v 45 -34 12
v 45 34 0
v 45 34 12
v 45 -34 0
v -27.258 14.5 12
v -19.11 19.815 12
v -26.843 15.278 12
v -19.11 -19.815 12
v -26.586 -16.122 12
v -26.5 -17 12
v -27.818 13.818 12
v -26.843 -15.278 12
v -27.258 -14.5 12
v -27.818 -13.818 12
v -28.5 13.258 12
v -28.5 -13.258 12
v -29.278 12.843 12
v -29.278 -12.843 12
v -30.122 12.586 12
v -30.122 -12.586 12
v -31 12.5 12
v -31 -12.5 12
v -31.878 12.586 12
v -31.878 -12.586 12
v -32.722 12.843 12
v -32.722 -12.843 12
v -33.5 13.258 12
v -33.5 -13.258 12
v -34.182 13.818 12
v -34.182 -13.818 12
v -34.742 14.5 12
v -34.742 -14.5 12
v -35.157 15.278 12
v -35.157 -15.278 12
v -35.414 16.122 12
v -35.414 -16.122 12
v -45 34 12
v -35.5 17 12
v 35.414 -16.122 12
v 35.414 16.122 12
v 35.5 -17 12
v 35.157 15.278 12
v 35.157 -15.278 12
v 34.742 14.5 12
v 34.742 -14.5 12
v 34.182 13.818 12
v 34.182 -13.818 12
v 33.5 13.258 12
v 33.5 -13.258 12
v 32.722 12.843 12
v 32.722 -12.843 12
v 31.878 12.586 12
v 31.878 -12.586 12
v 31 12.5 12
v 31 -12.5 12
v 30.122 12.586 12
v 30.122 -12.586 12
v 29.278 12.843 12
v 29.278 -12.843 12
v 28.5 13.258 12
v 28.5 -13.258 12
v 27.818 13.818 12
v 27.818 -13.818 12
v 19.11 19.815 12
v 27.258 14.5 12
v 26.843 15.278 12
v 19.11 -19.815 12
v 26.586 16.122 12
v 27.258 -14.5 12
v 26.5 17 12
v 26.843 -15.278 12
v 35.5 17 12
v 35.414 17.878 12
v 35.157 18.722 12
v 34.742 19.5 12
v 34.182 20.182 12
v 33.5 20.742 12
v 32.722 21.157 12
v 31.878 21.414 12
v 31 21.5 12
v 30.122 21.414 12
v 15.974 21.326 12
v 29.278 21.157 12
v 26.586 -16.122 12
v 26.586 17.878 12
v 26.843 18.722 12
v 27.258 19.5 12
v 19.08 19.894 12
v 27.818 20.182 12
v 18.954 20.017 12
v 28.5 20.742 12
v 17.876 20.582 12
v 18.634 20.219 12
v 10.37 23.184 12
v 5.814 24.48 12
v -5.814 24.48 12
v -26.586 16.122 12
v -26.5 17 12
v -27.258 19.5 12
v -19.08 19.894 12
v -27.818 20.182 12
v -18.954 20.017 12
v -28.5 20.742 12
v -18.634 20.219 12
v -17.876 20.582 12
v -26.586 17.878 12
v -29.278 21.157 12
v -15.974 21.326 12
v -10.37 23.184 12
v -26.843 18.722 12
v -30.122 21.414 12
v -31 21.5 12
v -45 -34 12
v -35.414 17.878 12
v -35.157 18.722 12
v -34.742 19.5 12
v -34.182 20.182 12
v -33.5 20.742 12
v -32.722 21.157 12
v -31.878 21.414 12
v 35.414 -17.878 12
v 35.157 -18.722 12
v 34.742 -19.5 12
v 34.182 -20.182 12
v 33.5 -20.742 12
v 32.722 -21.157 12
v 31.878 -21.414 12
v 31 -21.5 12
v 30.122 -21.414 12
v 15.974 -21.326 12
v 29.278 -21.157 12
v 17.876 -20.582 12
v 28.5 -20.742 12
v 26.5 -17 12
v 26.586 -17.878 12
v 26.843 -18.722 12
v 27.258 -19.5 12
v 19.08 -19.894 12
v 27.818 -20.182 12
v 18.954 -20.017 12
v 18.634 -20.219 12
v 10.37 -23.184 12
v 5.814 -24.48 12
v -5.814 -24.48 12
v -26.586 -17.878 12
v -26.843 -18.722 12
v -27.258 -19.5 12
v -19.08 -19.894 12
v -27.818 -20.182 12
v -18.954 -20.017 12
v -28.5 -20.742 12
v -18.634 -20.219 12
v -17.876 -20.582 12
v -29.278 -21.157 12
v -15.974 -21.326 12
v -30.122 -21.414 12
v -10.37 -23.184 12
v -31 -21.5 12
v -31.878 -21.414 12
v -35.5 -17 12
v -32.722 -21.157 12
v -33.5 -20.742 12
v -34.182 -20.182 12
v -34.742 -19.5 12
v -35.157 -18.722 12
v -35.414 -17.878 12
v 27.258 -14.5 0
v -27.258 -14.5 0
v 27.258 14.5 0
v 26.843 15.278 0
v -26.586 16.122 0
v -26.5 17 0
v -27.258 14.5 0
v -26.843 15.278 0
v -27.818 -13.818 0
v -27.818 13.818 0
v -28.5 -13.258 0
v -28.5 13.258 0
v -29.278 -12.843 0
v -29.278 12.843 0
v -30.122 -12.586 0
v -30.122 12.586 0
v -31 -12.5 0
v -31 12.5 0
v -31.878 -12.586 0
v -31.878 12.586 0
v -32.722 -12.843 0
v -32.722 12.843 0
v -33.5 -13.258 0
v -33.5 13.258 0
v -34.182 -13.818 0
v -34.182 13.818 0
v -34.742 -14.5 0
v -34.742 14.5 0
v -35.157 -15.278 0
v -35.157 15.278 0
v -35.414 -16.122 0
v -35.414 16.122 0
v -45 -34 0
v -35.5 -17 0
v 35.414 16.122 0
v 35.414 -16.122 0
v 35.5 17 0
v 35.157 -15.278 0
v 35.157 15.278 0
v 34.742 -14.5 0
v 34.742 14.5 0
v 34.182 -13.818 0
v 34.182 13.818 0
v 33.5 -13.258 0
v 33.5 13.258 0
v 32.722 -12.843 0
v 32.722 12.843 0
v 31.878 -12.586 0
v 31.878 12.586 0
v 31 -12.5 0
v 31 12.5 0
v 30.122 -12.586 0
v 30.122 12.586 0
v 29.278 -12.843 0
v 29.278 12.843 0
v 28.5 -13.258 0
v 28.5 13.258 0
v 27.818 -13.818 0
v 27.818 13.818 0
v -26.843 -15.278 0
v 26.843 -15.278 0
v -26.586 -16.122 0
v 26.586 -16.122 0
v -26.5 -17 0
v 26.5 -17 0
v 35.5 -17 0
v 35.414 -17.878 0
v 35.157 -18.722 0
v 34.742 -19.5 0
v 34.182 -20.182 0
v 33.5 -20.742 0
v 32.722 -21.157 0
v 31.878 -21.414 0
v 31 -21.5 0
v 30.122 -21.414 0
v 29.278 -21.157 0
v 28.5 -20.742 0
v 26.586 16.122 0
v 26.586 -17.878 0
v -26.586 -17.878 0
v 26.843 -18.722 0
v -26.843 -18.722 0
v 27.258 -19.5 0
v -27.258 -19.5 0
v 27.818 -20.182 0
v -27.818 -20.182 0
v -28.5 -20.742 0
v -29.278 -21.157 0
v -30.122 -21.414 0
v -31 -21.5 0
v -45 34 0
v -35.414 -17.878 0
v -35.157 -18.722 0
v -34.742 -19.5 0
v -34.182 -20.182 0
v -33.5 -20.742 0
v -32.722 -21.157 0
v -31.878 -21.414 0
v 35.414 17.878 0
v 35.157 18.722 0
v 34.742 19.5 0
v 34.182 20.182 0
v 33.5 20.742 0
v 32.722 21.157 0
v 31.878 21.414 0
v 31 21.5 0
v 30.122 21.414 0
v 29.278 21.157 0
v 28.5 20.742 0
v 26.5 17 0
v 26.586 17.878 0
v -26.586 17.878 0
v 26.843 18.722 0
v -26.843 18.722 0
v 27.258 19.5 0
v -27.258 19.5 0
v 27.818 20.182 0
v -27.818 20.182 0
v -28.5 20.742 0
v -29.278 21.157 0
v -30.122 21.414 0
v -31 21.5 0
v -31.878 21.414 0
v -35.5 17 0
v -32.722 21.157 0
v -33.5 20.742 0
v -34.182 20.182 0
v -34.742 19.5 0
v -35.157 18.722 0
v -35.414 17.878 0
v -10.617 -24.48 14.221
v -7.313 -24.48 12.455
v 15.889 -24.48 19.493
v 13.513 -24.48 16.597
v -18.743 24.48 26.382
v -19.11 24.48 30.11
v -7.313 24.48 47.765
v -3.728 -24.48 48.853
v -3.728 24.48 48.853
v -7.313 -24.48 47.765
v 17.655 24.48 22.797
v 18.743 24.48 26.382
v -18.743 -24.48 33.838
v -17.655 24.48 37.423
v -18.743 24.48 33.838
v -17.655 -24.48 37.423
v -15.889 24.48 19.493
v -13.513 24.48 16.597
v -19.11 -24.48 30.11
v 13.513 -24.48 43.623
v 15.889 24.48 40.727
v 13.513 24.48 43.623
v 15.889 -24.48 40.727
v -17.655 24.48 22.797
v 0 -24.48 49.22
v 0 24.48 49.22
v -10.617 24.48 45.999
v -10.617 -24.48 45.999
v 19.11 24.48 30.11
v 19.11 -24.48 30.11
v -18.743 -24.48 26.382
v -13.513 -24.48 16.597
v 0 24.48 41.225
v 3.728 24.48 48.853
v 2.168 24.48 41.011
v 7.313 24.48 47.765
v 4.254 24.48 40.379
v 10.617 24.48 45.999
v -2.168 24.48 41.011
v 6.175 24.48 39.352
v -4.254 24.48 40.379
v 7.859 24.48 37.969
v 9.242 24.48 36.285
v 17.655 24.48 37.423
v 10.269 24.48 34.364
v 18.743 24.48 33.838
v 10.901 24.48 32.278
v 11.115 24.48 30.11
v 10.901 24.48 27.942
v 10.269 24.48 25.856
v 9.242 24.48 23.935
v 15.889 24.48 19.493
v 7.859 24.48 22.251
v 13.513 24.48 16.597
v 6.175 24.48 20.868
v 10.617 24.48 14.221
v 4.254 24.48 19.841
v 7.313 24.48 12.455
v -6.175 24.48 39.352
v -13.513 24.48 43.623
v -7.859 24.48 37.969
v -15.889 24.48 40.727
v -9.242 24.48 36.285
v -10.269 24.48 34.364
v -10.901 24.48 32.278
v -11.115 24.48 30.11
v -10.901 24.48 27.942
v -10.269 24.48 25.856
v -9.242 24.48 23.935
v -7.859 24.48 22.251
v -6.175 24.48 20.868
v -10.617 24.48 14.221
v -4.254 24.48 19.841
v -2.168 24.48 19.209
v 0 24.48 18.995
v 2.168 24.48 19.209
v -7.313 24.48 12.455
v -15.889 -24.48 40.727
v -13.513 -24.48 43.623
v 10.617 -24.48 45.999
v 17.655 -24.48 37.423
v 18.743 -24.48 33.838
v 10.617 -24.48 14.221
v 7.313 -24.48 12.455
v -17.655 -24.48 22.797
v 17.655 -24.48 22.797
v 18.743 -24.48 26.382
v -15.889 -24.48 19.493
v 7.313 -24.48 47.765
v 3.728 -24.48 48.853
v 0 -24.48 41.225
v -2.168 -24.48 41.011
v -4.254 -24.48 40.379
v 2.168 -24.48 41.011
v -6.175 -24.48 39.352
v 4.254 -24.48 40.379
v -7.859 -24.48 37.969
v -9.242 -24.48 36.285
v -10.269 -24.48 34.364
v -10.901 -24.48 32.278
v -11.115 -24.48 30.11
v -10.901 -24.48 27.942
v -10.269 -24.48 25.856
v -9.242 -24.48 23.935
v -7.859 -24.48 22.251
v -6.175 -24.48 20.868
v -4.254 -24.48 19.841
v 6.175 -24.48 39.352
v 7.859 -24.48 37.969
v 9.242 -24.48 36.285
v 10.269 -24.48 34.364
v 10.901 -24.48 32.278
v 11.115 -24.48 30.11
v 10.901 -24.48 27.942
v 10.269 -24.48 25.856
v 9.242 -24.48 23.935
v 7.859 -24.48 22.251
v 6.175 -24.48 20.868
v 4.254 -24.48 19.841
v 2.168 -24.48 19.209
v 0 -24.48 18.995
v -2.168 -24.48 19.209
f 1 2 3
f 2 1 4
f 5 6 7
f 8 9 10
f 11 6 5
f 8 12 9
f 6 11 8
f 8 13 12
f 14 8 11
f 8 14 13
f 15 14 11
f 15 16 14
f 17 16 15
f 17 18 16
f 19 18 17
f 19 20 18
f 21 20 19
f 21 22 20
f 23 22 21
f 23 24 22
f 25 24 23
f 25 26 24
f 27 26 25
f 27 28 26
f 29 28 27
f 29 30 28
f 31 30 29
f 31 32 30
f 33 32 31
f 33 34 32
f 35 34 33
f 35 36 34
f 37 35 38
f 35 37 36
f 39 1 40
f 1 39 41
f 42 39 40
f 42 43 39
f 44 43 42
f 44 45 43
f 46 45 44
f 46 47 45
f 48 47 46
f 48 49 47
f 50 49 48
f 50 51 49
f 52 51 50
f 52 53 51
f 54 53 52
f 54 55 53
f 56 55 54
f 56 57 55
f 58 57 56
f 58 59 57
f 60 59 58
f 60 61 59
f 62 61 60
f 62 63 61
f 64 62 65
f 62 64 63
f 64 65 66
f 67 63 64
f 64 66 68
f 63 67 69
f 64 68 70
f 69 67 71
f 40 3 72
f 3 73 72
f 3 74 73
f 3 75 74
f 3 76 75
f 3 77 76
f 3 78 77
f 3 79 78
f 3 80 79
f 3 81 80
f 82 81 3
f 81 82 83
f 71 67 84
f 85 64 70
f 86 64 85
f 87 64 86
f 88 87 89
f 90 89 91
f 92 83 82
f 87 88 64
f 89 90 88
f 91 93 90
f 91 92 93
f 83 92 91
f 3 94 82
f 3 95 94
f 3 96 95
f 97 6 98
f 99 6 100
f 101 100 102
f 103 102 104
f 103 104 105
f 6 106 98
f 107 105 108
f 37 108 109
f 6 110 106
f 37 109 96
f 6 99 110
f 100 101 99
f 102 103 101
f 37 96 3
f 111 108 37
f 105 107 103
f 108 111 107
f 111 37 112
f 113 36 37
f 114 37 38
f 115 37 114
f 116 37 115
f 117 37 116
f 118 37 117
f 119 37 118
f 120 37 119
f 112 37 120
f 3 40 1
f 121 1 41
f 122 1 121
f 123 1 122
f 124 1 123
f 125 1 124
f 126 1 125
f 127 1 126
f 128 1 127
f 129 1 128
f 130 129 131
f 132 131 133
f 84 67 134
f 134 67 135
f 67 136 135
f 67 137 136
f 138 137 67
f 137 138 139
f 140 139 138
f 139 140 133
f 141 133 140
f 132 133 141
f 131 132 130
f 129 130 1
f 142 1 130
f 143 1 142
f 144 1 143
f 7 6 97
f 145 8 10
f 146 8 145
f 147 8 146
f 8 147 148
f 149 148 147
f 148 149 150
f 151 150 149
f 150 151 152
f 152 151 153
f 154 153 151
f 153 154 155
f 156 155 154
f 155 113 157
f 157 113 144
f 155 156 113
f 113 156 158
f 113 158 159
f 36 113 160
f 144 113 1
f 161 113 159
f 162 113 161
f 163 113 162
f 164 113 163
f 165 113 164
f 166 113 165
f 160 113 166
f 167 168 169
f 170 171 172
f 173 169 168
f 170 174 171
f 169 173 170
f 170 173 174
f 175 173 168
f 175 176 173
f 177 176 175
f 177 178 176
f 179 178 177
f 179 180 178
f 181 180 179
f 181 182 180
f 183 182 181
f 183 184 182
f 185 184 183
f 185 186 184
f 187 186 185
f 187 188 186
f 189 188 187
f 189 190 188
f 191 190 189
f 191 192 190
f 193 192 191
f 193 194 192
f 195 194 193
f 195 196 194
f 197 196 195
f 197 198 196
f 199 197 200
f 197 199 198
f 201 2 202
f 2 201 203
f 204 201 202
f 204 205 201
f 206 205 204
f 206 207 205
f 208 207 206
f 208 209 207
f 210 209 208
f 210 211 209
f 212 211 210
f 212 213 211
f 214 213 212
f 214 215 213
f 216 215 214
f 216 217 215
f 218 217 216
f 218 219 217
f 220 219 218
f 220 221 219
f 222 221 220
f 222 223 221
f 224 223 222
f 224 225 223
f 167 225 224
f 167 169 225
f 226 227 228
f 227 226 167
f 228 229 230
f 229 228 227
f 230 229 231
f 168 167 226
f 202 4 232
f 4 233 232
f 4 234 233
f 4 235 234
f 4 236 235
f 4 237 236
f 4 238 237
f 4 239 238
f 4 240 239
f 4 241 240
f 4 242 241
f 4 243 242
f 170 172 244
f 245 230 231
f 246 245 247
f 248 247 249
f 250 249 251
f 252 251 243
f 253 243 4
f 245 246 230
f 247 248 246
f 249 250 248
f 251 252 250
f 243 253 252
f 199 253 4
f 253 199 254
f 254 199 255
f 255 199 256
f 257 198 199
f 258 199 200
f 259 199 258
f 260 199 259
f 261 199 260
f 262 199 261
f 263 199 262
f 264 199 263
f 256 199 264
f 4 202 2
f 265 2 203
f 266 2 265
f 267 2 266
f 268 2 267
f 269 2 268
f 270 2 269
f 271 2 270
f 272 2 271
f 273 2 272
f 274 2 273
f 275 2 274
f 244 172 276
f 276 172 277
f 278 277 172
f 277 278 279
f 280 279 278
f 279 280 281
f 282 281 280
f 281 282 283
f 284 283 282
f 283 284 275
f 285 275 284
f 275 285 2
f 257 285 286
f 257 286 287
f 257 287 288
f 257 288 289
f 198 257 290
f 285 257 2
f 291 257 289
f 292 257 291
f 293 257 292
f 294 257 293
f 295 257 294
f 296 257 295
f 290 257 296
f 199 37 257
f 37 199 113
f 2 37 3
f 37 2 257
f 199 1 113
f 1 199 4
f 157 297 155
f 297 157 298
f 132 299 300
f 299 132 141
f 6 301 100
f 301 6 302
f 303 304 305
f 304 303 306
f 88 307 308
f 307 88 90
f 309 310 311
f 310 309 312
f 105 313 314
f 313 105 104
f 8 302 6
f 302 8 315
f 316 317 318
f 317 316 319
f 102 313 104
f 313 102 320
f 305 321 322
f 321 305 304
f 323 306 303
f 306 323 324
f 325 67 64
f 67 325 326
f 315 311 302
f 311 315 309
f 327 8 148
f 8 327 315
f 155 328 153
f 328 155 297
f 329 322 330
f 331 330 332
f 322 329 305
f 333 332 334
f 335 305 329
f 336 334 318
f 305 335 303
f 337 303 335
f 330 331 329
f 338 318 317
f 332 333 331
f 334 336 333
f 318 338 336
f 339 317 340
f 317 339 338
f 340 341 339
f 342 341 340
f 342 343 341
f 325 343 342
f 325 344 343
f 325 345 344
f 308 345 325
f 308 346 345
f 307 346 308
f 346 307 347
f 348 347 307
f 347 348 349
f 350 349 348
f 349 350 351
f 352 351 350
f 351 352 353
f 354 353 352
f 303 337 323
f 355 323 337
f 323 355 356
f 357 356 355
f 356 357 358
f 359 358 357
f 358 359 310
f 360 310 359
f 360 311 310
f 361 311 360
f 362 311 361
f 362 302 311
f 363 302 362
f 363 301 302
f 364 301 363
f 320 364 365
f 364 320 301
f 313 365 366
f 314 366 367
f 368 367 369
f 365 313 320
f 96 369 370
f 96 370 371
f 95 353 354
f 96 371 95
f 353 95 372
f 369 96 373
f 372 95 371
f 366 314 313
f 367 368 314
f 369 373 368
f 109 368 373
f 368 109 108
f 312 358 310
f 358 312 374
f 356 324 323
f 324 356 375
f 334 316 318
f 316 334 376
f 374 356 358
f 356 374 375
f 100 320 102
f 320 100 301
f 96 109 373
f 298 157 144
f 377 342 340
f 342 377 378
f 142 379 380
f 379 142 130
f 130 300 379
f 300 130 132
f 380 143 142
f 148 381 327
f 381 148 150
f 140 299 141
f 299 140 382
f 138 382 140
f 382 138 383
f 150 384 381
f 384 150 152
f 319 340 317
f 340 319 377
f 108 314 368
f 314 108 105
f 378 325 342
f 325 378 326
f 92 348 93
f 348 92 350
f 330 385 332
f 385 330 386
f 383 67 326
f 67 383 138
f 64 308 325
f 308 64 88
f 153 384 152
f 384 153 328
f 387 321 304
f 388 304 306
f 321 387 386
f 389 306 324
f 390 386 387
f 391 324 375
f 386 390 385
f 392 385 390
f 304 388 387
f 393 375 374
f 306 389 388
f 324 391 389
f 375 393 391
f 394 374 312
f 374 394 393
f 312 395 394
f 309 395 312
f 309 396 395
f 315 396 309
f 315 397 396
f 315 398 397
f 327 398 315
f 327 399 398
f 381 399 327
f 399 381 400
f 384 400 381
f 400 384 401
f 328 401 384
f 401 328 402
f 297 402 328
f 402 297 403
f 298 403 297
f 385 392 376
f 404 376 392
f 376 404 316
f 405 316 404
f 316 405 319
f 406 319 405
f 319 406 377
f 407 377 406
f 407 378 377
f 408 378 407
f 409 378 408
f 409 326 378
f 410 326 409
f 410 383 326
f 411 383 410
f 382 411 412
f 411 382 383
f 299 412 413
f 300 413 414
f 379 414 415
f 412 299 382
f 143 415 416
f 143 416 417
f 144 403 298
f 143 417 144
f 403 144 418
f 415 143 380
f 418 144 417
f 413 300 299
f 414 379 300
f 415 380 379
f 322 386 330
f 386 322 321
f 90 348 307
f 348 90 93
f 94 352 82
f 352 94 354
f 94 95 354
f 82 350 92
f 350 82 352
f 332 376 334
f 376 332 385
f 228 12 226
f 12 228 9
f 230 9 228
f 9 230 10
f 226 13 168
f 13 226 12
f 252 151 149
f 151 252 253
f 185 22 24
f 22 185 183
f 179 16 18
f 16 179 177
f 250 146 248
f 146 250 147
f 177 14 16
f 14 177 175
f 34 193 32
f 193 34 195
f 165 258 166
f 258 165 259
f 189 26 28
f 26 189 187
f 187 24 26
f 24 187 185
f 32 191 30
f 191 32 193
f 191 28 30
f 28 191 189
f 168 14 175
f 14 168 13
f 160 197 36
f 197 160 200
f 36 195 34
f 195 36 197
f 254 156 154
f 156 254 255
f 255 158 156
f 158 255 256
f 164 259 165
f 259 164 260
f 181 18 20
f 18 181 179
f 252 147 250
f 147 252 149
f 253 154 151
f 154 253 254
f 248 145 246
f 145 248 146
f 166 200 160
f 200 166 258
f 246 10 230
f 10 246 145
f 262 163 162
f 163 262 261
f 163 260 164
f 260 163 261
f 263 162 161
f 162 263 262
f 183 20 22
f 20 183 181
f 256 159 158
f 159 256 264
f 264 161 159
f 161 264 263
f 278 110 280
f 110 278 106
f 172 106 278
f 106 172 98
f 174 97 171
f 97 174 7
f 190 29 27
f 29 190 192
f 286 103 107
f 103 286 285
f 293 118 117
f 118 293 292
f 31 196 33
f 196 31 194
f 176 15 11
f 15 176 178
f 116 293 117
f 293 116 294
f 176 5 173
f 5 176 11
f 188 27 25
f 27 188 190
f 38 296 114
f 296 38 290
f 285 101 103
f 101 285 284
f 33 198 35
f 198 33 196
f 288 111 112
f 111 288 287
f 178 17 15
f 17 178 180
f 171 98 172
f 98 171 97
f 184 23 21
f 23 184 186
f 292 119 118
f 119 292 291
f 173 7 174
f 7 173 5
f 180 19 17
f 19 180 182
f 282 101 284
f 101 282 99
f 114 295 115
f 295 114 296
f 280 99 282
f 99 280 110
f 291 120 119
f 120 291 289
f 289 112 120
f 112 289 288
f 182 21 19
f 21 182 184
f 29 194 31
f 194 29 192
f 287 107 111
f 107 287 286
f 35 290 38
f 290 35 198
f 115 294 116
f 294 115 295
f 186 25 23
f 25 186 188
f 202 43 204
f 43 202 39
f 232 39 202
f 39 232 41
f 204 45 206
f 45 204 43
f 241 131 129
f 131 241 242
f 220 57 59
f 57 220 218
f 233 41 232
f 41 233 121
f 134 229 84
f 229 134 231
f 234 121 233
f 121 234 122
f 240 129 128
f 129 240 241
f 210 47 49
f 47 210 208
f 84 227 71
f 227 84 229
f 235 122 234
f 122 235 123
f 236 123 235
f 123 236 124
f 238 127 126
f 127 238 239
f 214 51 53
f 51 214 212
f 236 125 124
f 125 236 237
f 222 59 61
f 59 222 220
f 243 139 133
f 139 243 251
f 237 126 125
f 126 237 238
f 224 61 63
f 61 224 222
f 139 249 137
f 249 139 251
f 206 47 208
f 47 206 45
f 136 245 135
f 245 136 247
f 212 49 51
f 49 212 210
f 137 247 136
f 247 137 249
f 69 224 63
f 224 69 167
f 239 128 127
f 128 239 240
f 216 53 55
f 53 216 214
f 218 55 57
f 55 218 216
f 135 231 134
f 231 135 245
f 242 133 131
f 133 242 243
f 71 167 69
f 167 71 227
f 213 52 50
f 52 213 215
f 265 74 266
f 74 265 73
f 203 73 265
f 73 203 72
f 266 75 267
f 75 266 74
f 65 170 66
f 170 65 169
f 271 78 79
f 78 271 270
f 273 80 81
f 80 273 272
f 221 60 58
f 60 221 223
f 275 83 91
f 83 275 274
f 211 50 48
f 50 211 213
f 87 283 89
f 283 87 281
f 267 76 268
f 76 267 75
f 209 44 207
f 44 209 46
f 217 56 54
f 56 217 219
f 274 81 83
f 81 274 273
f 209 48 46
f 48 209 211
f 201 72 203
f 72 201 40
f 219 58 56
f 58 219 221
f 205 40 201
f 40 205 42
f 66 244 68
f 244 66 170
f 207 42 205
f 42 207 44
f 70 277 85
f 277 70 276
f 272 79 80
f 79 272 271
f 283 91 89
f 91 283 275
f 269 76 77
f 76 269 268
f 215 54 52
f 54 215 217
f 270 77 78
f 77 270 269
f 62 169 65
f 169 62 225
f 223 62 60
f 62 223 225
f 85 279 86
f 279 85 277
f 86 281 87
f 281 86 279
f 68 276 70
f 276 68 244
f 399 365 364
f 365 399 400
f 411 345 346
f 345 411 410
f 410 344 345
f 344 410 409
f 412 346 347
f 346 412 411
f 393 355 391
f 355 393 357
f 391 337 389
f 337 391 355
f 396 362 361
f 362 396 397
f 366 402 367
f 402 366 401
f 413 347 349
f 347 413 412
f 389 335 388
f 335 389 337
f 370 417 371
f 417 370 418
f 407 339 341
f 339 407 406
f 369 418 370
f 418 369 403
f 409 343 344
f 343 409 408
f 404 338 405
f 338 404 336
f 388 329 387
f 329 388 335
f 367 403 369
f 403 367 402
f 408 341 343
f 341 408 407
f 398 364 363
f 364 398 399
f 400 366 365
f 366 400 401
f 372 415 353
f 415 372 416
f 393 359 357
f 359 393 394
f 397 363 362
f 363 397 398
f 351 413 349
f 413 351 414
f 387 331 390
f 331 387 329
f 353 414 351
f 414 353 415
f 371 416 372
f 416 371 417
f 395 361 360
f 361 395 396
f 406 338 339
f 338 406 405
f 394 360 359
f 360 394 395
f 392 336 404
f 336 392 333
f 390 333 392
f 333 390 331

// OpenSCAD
$fn = 32;

// ----------------------------------------------------------------------
// Bearing block: 90 x 68 mm base, 22.23 mm bore at 30.11 mm
// ----------------------------------------------------------------------

// --- parameters (mm) ---
base_w = 90;              // base width
base_d = 68;              // base depth
base_t = 12;              // base thickness
bore_d = 22.23;           // shaft / bearing bore
house_r = 19.11;          // housing outer radius
house_len = 48.96;        // housing length along the shaft
foot_w = 38.22;           // foot width under the housing
foot_len = 38.96;         // foot length along the shaft
axis_z = 30.11;           // bore axis height above the base
holes_d = 9;              // mounting holes
hole_x = 31;              // mounting hole spacing

difference() {
  union() {
    /* base plate with its underside on z = 0 */
    translate([0, 0, base_t / 2]) cube([base_w, base_d, base_t], center = true);
    /* hull foot: a straight web blending into the round housing */
    hull() {
      translate([0, 0, base_t - 0.5]) cube([foot_w, foot_len, 1.6], center = true);
      translate([0, 0, axis_z]) rotate([-90, 0, 0]) cylinder(h = house_len, d = 2 * house_r, center = true);
    }
  }
  /* bore through the housing, 2.5 mm clear on both sides */
  translate([0, 0, axis_z]) rotate([-90, 0, 0]) cylinder(h = house_len + 5, d = bore_d, center = true);
  /* mounting holes through the base plate */
  for (hx = [-31, 31]) {
    for (hy = [-17, 17]) {
      translate([hx, hy, -2.5]) cylinder(h = base_t + 5, d = holes_d);
    }
  }
}
